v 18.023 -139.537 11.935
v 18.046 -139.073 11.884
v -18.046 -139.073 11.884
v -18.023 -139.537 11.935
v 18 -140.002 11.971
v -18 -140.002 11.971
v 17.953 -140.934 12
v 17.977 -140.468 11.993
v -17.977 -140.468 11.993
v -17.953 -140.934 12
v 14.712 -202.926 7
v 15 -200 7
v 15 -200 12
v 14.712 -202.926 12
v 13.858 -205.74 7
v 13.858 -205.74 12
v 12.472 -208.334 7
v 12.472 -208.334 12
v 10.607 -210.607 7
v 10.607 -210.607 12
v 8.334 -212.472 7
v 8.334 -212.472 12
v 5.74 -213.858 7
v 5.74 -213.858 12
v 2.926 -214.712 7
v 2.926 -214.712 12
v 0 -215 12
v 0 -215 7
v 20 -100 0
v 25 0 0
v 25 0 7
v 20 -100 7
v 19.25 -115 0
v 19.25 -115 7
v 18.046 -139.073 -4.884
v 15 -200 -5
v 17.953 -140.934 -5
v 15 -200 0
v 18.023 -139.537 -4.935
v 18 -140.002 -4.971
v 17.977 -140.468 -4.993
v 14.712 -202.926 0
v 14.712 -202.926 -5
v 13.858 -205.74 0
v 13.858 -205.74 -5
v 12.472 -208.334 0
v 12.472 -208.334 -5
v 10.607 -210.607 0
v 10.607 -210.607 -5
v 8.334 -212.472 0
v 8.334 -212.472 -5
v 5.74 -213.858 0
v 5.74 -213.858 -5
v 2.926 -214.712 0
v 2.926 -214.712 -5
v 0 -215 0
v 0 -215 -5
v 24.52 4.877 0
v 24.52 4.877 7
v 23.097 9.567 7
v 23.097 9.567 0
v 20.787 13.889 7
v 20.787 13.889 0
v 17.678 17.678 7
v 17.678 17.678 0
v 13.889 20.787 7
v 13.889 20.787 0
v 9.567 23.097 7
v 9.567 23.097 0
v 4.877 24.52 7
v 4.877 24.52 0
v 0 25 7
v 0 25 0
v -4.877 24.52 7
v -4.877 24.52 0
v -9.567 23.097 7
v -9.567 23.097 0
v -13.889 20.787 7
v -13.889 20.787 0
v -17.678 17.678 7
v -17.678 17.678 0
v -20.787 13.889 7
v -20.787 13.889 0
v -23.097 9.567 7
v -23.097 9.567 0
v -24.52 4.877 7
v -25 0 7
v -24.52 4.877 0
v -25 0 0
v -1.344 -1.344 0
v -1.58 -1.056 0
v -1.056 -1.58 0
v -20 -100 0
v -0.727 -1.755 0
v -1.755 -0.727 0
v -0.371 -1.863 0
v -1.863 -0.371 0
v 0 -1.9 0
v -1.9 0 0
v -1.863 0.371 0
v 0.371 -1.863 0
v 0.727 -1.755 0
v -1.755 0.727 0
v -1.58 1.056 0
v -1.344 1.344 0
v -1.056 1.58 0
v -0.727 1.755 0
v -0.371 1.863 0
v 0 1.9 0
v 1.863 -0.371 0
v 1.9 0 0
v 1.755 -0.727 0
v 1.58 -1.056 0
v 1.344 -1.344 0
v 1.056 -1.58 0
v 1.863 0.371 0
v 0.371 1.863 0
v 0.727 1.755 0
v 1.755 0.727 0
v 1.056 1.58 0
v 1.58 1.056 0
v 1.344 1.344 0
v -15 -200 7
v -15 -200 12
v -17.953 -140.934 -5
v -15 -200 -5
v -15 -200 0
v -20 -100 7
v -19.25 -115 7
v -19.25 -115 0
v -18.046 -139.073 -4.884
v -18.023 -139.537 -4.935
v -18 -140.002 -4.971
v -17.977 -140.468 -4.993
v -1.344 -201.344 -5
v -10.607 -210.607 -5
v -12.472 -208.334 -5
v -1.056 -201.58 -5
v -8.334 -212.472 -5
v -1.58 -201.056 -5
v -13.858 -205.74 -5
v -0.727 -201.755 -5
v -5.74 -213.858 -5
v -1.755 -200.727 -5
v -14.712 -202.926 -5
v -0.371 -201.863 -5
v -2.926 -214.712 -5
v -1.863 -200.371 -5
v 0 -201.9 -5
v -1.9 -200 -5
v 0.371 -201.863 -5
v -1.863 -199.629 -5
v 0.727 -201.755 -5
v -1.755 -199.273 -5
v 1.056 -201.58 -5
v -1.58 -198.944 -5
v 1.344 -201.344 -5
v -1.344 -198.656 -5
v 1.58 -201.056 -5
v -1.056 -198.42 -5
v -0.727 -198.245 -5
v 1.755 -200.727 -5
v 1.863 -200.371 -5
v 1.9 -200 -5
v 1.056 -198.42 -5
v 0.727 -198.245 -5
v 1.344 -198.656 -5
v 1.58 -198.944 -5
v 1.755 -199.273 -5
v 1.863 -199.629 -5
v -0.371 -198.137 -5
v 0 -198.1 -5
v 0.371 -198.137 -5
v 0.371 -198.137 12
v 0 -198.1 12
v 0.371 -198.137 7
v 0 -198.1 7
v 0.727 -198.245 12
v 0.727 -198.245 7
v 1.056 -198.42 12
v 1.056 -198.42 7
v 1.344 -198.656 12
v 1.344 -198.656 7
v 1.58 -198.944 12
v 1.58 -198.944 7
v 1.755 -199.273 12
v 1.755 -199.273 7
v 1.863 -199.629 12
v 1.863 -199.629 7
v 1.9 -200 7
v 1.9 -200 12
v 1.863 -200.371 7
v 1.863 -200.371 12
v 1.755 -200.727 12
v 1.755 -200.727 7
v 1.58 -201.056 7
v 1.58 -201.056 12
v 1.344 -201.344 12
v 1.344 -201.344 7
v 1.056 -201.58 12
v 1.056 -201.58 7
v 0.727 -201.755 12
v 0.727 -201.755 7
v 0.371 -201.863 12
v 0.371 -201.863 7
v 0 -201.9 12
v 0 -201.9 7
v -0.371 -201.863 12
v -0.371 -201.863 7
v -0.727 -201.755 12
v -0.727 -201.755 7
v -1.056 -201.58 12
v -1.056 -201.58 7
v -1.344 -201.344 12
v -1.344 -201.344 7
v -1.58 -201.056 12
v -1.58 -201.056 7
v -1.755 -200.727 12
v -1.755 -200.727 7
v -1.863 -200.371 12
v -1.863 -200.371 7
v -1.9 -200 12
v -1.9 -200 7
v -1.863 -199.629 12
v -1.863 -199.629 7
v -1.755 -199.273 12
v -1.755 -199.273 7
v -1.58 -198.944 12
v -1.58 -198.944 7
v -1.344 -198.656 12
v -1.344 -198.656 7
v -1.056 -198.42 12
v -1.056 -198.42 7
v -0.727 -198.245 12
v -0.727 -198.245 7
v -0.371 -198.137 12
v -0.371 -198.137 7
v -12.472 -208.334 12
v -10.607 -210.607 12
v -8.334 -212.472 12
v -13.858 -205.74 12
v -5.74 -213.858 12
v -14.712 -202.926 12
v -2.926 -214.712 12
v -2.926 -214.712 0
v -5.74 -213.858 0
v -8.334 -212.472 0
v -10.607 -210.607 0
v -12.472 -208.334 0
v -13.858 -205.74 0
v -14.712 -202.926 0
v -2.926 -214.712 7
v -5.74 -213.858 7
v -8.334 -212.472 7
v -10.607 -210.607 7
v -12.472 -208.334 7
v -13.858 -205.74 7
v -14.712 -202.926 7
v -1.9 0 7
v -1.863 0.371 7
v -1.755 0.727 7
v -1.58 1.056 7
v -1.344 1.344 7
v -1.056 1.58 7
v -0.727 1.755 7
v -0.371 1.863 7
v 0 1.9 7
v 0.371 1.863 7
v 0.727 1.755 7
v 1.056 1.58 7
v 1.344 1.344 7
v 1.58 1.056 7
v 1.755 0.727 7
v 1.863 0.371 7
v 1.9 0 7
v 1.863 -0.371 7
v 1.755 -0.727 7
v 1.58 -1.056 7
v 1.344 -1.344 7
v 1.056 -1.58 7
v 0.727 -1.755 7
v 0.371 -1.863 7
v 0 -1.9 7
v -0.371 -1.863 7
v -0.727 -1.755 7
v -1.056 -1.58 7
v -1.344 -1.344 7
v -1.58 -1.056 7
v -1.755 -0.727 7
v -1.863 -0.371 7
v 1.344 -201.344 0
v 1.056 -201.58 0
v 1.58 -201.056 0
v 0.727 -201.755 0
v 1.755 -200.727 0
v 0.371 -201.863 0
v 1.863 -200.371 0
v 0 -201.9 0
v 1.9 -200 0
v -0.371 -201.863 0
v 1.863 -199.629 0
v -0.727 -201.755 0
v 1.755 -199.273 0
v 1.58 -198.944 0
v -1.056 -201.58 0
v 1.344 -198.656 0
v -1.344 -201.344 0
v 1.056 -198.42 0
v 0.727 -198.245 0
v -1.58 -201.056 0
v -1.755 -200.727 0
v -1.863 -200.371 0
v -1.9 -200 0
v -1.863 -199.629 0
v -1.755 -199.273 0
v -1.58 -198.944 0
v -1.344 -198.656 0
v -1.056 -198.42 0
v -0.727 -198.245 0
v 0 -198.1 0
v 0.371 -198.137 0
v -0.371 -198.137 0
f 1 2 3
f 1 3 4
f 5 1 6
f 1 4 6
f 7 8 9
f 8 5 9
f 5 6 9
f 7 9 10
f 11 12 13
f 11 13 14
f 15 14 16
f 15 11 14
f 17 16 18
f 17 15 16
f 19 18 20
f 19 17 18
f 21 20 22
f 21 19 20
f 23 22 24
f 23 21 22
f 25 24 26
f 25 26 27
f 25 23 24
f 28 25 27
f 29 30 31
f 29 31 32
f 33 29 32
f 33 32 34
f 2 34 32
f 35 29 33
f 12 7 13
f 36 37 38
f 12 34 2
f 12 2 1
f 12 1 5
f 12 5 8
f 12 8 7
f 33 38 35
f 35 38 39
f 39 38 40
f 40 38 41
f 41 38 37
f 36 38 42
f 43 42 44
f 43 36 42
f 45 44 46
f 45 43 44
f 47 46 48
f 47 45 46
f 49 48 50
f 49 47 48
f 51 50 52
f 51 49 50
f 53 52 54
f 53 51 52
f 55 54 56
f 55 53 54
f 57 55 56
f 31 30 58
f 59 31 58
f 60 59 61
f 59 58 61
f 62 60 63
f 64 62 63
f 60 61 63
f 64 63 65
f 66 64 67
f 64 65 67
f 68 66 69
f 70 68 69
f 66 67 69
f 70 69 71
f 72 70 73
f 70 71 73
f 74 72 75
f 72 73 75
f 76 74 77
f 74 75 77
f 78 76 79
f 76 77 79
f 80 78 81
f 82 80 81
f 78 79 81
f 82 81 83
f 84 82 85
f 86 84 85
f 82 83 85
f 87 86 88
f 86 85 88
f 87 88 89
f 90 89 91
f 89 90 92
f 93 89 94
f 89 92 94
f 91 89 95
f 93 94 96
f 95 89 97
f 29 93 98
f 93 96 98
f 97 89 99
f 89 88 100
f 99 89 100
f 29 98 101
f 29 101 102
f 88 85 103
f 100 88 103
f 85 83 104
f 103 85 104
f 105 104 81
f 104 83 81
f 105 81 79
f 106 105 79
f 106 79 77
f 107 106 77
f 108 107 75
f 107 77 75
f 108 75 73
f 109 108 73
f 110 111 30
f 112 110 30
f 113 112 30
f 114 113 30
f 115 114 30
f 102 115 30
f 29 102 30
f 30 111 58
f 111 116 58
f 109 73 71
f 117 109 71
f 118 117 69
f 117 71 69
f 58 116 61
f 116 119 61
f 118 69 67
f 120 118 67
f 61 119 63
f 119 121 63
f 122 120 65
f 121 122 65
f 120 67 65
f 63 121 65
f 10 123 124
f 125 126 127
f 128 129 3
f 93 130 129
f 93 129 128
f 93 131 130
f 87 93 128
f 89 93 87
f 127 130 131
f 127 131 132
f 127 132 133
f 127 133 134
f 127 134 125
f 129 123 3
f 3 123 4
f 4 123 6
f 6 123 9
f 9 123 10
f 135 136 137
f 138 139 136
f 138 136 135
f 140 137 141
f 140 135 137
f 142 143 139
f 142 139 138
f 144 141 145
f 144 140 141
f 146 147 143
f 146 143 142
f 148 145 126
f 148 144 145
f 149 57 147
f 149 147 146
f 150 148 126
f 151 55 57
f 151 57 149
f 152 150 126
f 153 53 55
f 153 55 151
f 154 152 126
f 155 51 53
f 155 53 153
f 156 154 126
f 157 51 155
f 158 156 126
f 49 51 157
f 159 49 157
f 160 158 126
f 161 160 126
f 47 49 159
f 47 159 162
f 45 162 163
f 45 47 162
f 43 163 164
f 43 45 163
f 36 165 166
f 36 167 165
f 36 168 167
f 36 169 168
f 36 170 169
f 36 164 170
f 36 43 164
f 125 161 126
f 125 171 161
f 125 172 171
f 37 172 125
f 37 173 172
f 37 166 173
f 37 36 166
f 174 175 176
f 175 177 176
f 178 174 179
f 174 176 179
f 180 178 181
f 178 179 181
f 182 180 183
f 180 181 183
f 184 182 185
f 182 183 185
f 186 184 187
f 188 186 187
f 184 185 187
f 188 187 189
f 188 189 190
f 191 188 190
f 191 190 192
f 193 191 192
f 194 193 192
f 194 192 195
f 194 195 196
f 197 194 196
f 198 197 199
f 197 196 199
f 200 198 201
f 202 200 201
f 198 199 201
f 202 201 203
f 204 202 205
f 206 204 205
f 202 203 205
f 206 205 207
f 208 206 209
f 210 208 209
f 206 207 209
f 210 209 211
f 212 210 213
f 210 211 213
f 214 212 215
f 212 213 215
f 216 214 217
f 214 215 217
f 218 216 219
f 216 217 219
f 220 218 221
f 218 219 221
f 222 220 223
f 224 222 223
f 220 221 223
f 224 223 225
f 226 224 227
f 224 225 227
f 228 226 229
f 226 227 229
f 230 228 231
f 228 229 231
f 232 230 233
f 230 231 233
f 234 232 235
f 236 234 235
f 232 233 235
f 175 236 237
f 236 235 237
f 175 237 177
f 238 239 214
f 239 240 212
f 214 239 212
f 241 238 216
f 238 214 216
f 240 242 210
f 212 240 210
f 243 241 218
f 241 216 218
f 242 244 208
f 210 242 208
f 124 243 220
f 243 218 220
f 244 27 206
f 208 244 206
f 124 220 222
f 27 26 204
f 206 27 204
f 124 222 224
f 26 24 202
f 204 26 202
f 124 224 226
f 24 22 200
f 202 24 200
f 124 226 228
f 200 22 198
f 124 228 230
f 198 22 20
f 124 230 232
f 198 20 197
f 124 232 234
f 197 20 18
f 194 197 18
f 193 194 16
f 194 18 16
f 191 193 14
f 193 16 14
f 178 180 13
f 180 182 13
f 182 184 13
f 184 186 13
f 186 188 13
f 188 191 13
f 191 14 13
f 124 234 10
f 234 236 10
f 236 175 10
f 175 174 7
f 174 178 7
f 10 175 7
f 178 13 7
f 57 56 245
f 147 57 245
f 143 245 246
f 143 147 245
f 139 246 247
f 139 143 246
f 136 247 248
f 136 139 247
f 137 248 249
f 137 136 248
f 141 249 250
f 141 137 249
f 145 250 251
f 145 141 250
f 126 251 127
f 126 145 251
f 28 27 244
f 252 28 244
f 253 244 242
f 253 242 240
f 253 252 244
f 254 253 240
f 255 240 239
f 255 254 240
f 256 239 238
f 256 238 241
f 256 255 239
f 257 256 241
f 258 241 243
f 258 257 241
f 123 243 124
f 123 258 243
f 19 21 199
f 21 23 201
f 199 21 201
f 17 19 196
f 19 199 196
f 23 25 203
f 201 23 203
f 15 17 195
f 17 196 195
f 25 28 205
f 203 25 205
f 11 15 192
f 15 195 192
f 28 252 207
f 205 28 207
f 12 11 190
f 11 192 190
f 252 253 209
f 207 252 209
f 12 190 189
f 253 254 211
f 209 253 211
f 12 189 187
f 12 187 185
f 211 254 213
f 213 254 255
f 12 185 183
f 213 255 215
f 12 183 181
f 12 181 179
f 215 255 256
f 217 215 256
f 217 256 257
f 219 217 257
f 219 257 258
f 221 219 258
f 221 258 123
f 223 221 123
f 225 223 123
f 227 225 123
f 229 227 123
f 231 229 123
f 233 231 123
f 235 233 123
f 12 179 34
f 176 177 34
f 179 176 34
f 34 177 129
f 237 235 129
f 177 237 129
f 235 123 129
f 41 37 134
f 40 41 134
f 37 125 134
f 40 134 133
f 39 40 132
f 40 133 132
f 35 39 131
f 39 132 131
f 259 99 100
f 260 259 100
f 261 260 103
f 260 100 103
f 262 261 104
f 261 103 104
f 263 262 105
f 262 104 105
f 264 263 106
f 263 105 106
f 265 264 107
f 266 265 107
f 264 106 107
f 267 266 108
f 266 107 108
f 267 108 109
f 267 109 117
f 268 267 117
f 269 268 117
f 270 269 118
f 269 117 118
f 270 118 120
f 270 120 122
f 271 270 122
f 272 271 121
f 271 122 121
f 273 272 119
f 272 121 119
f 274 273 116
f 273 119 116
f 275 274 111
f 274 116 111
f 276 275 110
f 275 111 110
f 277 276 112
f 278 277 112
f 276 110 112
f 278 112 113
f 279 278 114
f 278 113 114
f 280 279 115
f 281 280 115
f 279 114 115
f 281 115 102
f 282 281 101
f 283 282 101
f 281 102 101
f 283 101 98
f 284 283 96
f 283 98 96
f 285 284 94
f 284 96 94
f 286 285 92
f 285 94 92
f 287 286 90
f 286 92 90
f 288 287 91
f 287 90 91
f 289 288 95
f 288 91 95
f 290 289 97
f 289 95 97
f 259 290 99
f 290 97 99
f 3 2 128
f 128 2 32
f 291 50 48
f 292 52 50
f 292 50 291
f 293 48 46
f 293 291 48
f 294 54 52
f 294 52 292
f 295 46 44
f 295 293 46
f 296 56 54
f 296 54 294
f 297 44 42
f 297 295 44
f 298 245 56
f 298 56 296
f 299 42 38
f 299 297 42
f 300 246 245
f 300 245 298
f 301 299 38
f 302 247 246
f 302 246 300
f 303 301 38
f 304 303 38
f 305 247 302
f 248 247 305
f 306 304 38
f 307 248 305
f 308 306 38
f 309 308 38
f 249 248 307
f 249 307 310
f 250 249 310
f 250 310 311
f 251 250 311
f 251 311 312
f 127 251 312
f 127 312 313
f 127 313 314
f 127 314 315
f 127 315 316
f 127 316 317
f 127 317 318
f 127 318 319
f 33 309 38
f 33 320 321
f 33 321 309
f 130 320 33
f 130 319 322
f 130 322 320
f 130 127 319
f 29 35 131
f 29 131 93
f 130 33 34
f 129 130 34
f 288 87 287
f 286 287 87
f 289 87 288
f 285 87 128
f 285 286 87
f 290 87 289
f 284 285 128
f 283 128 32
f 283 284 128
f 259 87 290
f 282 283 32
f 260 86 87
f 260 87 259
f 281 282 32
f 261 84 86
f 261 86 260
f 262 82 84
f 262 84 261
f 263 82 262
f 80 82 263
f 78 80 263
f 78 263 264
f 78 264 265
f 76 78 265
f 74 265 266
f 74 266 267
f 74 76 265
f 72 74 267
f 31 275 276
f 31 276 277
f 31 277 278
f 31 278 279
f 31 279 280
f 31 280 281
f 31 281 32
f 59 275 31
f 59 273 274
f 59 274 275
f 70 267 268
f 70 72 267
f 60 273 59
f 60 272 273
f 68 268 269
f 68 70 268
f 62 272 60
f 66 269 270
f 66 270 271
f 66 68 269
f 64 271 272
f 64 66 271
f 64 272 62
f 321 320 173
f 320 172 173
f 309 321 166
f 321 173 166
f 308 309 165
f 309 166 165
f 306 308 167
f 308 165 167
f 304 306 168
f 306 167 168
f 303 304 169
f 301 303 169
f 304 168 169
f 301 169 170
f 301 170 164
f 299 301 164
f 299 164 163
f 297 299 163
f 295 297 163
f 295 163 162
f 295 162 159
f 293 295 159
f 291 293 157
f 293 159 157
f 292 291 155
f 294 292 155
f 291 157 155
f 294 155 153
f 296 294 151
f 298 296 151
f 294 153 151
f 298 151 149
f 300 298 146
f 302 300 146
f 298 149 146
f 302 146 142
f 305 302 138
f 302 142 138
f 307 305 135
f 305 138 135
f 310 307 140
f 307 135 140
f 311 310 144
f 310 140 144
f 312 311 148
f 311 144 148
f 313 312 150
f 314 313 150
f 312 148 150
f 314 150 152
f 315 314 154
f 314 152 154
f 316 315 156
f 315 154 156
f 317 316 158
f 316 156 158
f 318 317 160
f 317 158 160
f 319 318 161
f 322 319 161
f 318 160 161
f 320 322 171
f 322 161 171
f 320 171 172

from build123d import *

# Parameters (mm, degrees)
BOSS_EXTRUDE1_DEPTH  = 7
SKETCH6_R            = 2.25
CUT_EXTRUDE4_DEPTH   = 25
BOSS_EXTRUDE2_START  = -21
BOSS_EXTRUDE2_DEPTH  = 43
CUT_EXTRUDE5_DEPTH   = 28
FILLET1_R            = 15
FILLET1_OF_MIRROR1_R = 15
SKETCH12_W           = 7
SKETCH12_H           = 100
CUT_EXTRUDE6_DEPTH   = 24.5
SKETCH13_R           = 1.9
CUT_EXTRUDE7_DEPTH   = 24.5
SKETCH14_R           = 1.9
CUT_EXTRUDE8_DEPTH   = 7


with BuildPart() as part:
    # Sketch2 → Boss-Extrude1 (new body)
    with BuildSketch(Plane.XY):
        with BuildLine():
            Line((15, -200), (25, 0))
            ThreePointArc((25, 0), (0, 25), (-25, 0))
            Line((-25, 0), (-15, -200))
            ThreePointArc((-15, -200), (0, -215), (15, -200))
        make_face()
    extrude(amount=BOSS_EXTRUDE1_DEPTH)

    # Sketch6 → Cut-Extrude4 (cut)
    with BuildSketch(Plane.XY.offset(7)):
        with Locations((0, -200)):
            Circle(SKETCH6_R)
    extrude(amount=-CUT_EXTRUDE4_DEPTH, mode=Mode.SUBTRACT)

    # Sketch9 → Boss-Extrude2 (add)
    with BuildSketch(Plane.ZY.offset(BOSS_EXTRUDE2_START)):
        Polygon((0, -200), (0, -215), (-5, -215), (-5, -140), (0, -100), align=None)
    boss_extrude2 = extrude(amount=BOSS_EXTRUDE2_DEPTH)

    # Sketch10 → Cut-Extrude5 (cut, symmetric)
    with BuildSketch(Plane.XY.offset(7)):
        with BuildLine():
            Line((21, -100), (20, -100))
            Line((20, -100), (15, -200))
            ThreePointArc((15, -200), (10.606601767, -210.606601669), (1.38e-07, -215))
            Line((1.38e-07, -215), (21, -215))
            Line((21, -215), (21, -100))
        make_face()
        with BuildLine():
            Line((-22, -215), (1.38e-07, -215))
            ThreePointArc((1.38e-07, -215), (-10.606601669, -210.606601767), (-15, -200))
            Line((-15, -200), (-20, -100))
            Line((-20, -100), (-22, -100))
            Line((-22, -100), (-22, -215))
        make_face()
    cut_extrude5 = extrude(amount=CUT_EXTRUDE5_DEPTH, both=True, mode=Mode.SUBTRACT)

    # Fillet1
    fillet1_edges = [part.edges().sort_by_distance(p)[0] for p in [
        (0, -140, -5),
    ]]
    fillet(fillet1_edges, radius=FILLET1_R)

    # Mirror1: Boss-Extrude2 across plane
    add(boss_extrude2.mirror(Plane.XY.offset(3.5)))

    # Fillet1 of Mirror1
    fillet1_of_mirror1_edges = [part.edges().sort_by_distance(p)[0] for p in [
        (0, -140, 12),
    ]]
    fillet(fillet1_of_mirror1_edges, radius=FILLET1_OF_MIRROR1_R)

    # Mirror2: Cut-Extrude5 across plane
    add(cut_extrude5.mirror(Plane.XY.offset(3.5)), mode=Mode.SUBTRACT)

    # Sketch12 → Cut-Extrude6 (cut, symmetric)
    with BuildSketch(Plane.ZY):
        with Locations((3.5, -165)):
            Rectangle(SKETCH12_W, SKETCH12_H)
    extrude(amount=CUT_EXTRUDE6_DEPTH, both=True, mode=Mode.SUBTRACT)

    # Sketch13 → Cut-Extrude7 (cut, symmetric)
    with BuildSketch(Plane(origin=(0, 0, -5), x_dir=(-1, 0, 0), z_dir=(0, 0, -1))):
        with Locations(Location((0, -200, 0), (0, 0, 90))):
            Circle(SKETCH13_R)
    extrude(amount=CUT_EXTRUDE7_DEPTH, both=True, mode=Mode.SUBTRACT)

    # Sketch14 → Cut-Extrude8 (cut)
    with BuildSketch(Plane(origin=(0, 0, 0), x_dir=(-1, 0, 0), z_dir=(0, 0, -1))):
        Circle(SKETCH14_R)
    extrude(amount=-CUT_EXTRUDE8_DEPTH, mode=Mode.SUBTRACT)


solid = part.part
